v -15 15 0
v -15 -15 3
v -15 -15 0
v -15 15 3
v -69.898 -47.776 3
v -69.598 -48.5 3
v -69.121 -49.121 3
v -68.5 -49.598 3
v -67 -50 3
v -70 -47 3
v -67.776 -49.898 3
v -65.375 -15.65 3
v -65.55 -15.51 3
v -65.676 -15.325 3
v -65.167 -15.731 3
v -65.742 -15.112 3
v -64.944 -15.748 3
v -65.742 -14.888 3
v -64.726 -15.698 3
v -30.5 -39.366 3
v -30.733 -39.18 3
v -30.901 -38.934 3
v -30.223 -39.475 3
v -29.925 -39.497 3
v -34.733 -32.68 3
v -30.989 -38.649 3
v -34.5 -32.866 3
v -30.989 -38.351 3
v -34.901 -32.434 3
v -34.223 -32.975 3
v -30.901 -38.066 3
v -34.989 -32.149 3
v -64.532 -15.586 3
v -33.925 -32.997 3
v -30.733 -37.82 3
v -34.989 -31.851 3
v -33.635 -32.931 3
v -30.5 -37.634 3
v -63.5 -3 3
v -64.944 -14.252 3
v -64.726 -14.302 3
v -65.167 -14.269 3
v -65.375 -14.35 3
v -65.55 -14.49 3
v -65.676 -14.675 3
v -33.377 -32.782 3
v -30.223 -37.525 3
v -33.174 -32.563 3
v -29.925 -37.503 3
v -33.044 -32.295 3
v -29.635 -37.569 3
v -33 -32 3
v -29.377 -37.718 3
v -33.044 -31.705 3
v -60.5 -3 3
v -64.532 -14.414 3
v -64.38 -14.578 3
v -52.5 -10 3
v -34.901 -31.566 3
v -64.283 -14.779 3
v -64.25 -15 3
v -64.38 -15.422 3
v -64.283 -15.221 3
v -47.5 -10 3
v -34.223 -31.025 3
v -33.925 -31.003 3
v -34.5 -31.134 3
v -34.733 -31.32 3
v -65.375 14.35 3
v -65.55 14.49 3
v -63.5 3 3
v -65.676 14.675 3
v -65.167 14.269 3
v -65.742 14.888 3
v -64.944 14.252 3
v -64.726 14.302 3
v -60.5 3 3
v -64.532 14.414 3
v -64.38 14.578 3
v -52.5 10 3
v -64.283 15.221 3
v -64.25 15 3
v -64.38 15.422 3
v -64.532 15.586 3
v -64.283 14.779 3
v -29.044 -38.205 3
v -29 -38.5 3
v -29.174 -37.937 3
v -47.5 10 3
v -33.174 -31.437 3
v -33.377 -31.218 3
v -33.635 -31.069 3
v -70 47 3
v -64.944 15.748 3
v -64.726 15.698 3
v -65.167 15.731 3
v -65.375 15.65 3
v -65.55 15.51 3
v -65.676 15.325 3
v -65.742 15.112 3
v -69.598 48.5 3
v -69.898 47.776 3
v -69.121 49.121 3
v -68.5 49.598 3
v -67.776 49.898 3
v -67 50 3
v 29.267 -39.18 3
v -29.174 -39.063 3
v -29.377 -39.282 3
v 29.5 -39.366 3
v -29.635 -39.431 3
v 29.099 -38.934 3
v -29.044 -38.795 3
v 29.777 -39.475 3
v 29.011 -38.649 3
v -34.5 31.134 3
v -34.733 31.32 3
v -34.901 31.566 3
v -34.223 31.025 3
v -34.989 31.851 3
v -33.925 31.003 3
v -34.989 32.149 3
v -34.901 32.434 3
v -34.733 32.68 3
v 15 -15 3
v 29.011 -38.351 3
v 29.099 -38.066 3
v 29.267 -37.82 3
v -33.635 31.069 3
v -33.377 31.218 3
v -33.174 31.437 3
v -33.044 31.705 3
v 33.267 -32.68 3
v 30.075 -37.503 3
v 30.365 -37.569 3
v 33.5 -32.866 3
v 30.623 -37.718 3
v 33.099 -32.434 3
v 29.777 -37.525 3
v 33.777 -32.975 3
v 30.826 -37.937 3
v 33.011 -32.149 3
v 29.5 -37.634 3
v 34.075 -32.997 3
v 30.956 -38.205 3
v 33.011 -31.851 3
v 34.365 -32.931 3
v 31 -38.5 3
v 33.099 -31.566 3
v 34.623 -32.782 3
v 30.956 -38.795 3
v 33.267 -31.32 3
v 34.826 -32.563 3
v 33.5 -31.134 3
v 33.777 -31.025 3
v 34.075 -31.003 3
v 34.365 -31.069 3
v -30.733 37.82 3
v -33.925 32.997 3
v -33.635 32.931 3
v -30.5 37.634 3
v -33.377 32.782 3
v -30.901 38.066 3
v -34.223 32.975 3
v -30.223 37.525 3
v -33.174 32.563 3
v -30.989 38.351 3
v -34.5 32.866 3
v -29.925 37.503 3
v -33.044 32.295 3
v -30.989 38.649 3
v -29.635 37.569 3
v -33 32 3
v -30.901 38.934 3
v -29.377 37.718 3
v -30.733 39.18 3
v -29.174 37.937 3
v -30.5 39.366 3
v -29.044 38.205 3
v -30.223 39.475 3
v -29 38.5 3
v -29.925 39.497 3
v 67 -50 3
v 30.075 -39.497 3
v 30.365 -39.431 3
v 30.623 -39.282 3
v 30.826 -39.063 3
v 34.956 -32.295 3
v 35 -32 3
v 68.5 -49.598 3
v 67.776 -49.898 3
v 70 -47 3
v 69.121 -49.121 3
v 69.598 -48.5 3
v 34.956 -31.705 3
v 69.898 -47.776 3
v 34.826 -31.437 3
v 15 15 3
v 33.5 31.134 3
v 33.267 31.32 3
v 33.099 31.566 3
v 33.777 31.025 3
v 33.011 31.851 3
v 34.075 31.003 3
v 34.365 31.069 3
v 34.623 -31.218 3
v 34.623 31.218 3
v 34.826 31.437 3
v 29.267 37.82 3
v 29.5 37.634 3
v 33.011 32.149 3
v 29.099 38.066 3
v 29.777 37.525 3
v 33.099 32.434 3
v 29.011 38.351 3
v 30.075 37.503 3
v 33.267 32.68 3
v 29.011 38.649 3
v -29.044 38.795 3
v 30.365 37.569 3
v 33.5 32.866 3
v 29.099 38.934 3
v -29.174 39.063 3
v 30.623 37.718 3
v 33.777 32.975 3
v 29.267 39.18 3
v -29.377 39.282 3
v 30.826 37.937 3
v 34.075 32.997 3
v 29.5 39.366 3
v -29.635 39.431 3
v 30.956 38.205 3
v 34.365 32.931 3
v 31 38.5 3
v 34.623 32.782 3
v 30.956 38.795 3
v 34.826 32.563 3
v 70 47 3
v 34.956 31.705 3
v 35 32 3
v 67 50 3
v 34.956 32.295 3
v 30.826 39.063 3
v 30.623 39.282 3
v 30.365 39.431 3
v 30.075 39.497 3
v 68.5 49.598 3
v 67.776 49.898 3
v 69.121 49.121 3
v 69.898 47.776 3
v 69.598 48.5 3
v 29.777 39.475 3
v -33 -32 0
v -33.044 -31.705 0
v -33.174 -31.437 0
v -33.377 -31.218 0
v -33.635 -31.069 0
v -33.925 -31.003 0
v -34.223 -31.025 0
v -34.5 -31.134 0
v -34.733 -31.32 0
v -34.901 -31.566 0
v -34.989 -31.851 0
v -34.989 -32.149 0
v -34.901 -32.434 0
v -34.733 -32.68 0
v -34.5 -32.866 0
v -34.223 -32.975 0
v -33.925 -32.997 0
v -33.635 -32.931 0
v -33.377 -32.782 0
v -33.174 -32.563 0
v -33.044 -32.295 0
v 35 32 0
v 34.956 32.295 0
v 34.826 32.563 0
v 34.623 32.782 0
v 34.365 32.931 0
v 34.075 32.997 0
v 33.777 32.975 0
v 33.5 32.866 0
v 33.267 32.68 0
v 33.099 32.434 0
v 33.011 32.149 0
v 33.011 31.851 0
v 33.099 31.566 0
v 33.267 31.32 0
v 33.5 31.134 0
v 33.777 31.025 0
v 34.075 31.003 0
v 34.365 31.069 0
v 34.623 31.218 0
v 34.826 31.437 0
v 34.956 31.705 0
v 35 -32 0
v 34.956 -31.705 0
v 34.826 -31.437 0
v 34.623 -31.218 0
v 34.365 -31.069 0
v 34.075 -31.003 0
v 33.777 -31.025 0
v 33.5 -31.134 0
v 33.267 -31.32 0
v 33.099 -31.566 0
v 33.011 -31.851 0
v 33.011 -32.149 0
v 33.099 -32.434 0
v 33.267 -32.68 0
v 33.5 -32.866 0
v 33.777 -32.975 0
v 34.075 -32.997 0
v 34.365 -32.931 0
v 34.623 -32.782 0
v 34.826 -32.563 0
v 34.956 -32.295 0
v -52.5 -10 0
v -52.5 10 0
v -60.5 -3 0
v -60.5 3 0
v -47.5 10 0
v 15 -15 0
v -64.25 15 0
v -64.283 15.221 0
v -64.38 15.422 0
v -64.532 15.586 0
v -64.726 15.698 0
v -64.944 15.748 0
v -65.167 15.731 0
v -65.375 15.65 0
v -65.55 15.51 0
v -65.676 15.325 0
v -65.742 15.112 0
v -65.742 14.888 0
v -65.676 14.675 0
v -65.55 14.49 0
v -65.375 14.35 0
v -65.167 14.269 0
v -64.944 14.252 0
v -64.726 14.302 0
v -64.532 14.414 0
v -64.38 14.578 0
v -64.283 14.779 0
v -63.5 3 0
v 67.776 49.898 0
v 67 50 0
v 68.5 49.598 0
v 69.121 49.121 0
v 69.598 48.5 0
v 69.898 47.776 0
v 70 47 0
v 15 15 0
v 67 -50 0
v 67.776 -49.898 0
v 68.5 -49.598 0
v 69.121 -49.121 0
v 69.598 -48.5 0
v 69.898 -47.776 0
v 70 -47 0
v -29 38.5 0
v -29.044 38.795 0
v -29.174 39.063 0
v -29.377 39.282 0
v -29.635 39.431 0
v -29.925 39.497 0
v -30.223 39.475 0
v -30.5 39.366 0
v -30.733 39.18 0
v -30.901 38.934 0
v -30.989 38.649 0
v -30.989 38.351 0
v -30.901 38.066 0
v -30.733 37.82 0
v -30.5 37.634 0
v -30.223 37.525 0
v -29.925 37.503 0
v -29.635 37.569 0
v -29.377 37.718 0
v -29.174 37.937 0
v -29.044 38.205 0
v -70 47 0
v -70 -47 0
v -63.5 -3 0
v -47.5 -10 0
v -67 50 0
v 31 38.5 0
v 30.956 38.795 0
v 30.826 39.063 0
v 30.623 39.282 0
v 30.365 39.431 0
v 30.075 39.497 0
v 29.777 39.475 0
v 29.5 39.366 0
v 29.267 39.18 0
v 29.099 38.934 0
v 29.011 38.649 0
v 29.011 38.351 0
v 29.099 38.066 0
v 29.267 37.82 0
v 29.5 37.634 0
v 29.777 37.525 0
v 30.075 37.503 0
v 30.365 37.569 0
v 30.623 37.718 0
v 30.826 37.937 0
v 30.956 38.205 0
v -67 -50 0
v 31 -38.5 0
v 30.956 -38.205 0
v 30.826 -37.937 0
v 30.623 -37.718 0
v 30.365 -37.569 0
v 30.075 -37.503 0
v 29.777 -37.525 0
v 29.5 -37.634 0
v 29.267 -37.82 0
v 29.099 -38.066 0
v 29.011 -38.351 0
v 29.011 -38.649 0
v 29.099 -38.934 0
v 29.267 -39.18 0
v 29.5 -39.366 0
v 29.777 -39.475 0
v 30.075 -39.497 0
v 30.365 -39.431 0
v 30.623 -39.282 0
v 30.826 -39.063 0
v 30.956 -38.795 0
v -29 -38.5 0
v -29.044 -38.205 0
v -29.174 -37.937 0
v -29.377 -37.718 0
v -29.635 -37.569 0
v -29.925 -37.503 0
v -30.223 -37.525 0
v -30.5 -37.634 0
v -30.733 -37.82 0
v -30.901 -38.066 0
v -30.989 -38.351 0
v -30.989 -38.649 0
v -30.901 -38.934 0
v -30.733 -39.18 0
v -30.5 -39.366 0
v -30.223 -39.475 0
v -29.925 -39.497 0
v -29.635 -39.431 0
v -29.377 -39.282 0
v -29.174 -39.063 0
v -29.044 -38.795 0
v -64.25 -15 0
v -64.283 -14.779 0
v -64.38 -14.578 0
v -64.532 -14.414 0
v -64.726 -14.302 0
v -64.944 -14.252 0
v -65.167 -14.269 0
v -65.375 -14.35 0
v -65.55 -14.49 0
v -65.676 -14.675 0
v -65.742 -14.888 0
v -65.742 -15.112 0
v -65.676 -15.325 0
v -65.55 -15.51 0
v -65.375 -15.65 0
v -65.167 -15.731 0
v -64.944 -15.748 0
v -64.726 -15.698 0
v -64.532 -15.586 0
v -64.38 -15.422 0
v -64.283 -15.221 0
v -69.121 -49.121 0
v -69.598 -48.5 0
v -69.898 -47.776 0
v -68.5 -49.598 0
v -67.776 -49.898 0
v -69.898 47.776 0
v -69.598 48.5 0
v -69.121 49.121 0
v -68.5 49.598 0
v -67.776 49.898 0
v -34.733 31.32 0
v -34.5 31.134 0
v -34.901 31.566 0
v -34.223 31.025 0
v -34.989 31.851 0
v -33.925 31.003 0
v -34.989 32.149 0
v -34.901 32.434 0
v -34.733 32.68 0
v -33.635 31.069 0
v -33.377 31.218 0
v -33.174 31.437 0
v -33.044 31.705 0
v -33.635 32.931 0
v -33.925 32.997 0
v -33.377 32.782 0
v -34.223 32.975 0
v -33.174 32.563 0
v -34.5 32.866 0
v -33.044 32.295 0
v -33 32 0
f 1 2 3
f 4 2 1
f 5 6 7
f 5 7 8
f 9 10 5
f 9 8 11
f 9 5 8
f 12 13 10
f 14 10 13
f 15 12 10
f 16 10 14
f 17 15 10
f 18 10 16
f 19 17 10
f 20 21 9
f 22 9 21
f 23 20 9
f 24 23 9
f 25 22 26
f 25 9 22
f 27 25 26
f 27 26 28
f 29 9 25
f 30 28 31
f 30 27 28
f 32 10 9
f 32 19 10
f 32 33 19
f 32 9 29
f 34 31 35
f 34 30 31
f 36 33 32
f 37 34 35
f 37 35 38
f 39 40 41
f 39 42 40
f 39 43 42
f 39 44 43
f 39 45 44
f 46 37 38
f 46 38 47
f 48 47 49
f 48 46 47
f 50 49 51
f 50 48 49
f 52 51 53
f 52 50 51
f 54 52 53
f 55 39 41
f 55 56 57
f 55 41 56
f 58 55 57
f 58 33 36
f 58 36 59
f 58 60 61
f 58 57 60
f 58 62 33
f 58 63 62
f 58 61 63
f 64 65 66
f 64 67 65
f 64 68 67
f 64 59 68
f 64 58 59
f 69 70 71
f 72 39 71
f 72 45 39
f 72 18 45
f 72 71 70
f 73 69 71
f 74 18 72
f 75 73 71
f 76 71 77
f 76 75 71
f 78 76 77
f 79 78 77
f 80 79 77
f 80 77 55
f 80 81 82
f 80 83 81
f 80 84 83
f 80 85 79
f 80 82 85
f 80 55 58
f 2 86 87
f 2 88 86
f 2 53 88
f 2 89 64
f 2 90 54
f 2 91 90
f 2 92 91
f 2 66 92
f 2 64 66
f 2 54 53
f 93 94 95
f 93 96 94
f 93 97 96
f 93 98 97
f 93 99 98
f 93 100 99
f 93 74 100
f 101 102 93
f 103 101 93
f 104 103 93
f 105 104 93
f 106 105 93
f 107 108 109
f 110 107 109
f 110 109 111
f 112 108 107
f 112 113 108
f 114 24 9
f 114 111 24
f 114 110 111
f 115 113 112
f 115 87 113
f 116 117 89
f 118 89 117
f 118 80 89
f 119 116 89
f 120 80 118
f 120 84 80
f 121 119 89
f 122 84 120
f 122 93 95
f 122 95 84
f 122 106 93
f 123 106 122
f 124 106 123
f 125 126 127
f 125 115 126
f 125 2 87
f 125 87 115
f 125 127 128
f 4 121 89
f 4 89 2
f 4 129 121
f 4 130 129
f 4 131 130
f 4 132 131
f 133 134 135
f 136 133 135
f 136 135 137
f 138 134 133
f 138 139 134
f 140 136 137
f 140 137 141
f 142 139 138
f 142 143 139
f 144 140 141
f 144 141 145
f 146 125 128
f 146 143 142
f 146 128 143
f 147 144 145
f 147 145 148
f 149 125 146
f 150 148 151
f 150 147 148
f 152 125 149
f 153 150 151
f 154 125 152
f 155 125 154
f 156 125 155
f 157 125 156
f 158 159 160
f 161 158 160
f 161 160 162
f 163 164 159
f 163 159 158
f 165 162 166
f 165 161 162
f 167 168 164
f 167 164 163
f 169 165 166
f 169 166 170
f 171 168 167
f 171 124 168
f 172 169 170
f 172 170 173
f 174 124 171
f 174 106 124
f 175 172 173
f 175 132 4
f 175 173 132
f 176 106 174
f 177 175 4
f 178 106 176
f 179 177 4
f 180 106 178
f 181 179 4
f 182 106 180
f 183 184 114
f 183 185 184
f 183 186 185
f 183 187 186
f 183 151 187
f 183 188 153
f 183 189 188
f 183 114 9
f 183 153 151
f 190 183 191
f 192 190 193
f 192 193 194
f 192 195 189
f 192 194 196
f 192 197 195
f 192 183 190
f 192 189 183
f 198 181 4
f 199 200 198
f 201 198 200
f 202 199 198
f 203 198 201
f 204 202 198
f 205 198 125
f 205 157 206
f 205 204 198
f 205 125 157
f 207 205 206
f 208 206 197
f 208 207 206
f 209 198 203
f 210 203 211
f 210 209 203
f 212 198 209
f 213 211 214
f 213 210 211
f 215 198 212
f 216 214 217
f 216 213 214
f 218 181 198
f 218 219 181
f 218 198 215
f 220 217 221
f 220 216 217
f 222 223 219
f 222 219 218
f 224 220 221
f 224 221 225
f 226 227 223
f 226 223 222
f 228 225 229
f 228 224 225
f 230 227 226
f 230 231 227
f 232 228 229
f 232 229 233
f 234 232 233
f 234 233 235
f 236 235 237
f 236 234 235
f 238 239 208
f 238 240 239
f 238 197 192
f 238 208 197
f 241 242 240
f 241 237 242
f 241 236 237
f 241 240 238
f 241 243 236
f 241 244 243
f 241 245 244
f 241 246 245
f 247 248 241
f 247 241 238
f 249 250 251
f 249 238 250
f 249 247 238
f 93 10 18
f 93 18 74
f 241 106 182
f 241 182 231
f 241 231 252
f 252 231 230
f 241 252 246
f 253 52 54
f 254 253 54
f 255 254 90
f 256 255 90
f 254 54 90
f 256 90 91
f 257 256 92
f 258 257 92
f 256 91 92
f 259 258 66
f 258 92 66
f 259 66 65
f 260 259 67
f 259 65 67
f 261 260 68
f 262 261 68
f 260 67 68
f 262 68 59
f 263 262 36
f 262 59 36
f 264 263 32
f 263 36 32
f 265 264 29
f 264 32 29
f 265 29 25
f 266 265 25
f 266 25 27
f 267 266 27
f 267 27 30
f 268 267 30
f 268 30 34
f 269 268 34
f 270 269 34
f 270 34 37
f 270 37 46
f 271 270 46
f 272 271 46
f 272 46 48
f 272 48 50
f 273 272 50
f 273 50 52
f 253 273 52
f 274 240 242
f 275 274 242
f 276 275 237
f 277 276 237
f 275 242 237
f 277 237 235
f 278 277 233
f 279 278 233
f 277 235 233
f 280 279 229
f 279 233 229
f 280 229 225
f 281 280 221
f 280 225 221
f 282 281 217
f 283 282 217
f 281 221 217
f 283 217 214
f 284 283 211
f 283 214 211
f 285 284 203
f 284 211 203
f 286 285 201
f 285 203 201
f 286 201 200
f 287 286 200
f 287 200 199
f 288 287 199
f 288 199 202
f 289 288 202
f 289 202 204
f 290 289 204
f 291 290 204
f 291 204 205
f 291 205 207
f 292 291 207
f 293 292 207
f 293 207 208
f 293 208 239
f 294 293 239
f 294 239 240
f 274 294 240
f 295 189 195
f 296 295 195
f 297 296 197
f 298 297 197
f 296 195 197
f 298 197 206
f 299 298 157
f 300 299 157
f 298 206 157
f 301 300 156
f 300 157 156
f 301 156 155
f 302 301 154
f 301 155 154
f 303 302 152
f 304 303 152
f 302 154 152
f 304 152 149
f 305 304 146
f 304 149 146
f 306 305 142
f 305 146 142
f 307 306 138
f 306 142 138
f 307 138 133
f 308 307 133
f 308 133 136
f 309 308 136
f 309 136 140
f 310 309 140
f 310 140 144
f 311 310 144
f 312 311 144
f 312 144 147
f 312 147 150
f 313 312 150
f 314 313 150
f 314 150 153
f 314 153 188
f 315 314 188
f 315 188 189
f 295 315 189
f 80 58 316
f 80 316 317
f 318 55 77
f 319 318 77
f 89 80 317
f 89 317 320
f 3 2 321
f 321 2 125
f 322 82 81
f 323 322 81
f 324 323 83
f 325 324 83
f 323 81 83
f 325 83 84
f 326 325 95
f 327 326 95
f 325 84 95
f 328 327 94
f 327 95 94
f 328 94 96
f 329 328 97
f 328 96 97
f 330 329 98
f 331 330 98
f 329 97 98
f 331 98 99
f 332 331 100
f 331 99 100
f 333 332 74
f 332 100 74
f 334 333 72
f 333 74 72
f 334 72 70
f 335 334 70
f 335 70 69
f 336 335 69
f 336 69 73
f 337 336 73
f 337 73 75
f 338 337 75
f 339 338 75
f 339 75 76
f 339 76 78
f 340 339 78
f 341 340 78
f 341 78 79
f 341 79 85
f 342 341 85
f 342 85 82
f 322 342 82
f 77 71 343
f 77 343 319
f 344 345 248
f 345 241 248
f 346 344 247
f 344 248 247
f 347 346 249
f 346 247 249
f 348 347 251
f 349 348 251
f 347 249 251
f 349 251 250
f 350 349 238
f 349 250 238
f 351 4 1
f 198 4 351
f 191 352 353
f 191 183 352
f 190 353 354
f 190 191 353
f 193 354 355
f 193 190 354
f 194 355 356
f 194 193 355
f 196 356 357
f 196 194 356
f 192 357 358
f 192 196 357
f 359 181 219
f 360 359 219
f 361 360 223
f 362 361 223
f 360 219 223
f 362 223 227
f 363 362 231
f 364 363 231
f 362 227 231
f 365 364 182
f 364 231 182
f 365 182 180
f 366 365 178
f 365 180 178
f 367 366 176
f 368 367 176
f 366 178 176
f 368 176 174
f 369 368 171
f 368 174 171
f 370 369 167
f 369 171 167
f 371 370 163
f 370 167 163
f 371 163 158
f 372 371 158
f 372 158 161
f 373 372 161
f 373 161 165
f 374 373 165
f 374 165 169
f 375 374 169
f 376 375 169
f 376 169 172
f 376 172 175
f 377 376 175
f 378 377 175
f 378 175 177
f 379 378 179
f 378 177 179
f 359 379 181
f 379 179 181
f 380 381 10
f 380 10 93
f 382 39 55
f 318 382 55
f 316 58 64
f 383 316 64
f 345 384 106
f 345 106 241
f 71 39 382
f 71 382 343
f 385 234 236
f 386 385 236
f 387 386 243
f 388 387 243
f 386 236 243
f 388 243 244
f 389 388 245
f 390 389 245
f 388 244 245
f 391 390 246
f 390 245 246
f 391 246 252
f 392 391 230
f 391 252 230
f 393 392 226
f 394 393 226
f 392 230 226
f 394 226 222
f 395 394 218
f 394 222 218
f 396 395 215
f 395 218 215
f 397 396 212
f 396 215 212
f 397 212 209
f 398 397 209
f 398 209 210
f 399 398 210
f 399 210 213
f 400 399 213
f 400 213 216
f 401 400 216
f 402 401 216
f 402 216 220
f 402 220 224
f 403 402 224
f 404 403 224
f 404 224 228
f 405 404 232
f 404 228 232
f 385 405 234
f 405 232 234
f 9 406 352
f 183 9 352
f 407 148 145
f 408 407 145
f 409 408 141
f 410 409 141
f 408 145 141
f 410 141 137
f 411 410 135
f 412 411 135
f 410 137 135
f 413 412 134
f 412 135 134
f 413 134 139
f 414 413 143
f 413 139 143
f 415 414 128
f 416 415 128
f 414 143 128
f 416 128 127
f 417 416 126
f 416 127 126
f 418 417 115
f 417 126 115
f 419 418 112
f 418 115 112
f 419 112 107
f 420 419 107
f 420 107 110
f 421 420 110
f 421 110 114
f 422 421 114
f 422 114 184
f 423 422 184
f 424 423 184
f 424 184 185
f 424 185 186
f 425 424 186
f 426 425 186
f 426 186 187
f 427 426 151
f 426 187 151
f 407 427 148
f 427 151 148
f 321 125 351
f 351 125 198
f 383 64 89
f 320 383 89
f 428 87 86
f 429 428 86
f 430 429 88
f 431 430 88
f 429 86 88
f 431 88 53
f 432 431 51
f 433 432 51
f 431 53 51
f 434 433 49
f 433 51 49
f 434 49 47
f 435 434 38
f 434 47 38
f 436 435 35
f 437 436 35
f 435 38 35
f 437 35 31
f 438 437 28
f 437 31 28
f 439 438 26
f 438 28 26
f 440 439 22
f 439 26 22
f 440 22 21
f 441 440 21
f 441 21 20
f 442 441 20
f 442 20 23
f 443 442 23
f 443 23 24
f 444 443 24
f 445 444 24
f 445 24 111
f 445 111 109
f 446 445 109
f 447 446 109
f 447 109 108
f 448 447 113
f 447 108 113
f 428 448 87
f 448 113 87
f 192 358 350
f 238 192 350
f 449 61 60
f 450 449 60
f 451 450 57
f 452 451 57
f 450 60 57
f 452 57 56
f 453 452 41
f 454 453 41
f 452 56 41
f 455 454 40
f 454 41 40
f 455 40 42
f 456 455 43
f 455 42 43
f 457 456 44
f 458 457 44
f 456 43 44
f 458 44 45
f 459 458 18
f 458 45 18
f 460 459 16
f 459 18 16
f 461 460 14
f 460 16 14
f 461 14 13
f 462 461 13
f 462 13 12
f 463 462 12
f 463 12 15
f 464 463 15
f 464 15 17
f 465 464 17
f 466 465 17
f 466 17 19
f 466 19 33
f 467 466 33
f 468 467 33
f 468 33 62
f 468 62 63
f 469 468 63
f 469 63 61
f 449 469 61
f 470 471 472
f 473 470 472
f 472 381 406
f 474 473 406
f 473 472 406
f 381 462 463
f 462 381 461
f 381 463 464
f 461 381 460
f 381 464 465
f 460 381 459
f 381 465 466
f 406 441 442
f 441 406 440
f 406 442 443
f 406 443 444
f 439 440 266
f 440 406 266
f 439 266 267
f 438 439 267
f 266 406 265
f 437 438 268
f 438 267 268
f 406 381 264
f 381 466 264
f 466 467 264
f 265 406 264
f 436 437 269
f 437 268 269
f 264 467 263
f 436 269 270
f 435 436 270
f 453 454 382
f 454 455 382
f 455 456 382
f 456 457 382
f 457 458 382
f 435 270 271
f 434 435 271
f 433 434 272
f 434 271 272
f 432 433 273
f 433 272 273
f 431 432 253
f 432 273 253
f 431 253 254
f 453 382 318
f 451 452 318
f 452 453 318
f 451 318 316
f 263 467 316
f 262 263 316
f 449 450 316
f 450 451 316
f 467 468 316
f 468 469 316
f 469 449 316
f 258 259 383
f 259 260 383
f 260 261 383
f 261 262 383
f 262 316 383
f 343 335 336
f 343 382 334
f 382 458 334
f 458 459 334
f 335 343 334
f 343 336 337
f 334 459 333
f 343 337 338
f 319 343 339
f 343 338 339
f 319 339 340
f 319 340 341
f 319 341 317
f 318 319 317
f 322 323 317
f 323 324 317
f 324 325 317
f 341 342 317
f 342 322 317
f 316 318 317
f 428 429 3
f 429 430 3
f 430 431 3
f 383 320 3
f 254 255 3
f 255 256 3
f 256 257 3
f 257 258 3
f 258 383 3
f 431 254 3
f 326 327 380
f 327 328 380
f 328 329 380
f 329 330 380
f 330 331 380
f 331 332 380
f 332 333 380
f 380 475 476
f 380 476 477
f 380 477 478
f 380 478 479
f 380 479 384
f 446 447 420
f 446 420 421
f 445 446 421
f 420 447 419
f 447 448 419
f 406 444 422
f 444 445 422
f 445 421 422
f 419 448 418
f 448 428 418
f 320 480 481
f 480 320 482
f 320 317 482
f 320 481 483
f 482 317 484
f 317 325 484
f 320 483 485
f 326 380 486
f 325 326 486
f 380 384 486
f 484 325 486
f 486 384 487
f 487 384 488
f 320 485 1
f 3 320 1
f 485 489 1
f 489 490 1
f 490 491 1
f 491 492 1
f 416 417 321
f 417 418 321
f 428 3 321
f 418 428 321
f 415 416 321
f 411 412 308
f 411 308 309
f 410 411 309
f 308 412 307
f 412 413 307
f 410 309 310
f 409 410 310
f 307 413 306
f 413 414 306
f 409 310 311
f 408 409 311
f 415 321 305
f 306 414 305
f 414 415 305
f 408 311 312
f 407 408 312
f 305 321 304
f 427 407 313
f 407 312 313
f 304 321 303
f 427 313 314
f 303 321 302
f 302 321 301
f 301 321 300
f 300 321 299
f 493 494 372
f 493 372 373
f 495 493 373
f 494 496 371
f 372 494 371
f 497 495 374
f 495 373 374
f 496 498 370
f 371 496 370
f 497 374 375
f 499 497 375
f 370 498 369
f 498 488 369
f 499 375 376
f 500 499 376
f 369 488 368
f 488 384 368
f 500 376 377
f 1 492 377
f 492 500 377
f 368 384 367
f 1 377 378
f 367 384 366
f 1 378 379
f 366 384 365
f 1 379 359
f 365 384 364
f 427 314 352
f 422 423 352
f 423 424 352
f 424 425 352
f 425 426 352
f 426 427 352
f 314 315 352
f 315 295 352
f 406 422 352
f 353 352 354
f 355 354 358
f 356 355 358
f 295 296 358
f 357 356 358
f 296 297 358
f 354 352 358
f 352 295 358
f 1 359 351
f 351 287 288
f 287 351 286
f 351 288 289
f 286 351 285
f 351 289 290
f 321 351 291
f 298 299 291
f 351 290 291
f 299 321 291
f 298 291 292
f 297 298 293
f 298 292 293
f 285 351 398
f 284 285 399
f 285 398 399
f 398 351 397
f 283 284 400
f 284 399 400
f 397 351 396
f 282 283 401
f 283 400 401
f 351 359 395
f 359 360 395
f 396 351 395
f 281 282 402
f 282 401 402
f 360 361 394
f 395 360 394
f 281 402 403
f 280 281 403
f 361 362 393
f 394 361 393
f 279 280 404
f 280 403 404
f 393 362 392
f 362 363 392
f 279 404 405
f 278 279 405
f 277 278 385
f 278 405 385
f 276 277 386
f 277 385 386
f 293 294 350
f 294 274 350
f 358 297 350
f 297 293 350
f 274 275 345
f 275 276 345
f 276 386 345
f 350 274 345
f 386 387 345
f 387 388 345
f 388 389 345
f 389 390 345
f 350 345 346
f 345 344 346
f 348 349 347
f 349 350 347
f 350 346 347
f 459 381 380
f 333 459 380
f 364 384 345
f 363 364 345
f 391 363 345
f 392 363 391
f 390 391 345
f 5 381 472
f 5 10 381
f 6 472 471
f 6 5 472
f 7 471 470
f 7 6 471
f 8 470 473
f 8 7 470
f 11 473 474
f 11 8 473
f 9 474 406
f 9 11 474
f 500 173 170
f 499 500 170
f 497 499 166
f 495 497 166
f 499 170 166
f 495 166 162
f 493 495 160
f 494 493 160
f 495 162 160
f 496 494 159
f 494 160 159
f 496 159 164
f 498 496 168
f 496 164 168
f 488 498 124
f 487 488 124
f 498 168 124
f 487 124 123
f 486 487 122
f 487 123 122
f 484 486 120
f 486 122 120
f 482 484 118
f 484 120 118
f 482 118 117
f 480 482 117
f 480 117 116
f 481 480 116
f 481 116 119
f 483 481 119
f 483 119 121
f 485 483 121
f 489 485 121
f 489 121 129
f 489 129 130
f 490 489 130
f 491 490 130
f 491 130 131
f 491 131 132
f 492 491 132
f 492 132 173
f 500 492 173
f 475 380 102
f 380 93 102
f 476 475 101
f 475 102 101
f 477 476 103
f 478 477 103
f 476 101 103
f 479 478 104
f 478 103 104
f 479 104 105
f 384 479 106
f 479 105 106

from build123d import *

# Parameters (mm, degrees)
SKETCH1_W           = 140
SKETCH1_H           = 100
BOSS_EXTRUDE1_DEPTH = 3
SKETCH2_R           = 1
CUT_EXTRUDE1_DEPTH  = 3
CUT_EXTRUDE2_REACH  = 88.076
SKETCH3_R           = 1
CUT_EXTRUDE3_REACH  = 88.076
SKETCH4_R           = 0.75
SKETCH4_W           = 30
SKETCH4_H           = 30
FILLET1_R           = 3
CUT_EXTRUDE4_REACH  = 88.076
SKETCH5_W           = 5
SKETCH5_H           = 20
CUT_EXTRUDE5_REACH  = 88.076
SKETCH6_W           = 3
SKETCH6_H           = 6


with BuildPart() as part:
    # Sketch1 → Boss-Extrude1 (new body)
    with BuildSketch(Plane.XY):
        Rectangle(SKETCH1_W, SKETCH1_H)
    extrude(amount=BOSS_EXTRUDE1_DEPTH)

    # Sketch2 → Cut-Extrude1 (cut)
    with BuildSketch(Plane.XY.offset(3)):
        with Locations((30, 38.5)):
            Circle(SKETCH2_R)
        with Locations((-30, 38.5)):
            Circle(SKETCH2_R)
        with Locations((30, -38.5)):
            Circle(SKETCH2_R)
        with Locations((-30, -38.5)):
            Circle(SKETCH2_R)
    extrude(amount=-CUT_EXTRUDE1_DEPTH, mode=Mode.SUBTRACT)

    # Sketch3 → Cut-Extrude2 (cut, up to next)
    with BuildSketch(Plane.XY.offset(3), mode=Mode.PRIVATE) as cut_extrude2_sk1:
        with Locations((34, 32)):
            Circle(SKETCH3_R)
    cut_extrude2_tool1 = extrude(cut_extrude2_sk1.sketch, amount=-CUT_EXTRUDE2_REACH, mode=Mode.PRIVATE) & part.part
    # Sketch3 → Cut-Extrude2 (cut, up to next)
    with BuildSketch(Plane.XY.offset(3), mode=Mode.PRIVATE) as cut_extrude2_sk2:
        with Locations((34, -32)):
            Circle(SKETCH3_R)
    cut_extrude2_tool2 = extrude(cut_extrude2_sk2.sketch, amount=-CUT_EXTRUDE2_REACH, mode=Mode.PRIVATE) & part.part
    # Sketch3 → Cut-Extrude2 (cut, up to next)
    with BuildSketch(Plane.XY.offset(3), mode=Mode.PRIVATE) as cut_extrude2_sk3:
        with Locations((-34, 32)):
            Circle(SKETCH3_R)
    cut_extrude2_tool3 = extrude(cut_extrude2_sk3.sketch, amount=-CUT_EXTRUDE2_REACH, mode=Mode.PRIVATE) & part.part
    # Sketch3 → Cut-Extrude2 (cut, up to next)
    with BuildSketch(Plane.XY.offset(3), mode=Mode.PRIVATE) as cut_extrude2_sk4:
        with Locations((-34, -32)):
            Circle(SKETCH3_R)
    cut_extrude2_tool4 = extrude(cut_extrude2_sk4.sketch, amount=-CUT_EXTRUDE2_REACH, mode=Mode.PRIVATE) & part.part
    add(cut_extrude2_tool1.solids().sort_by_distance((34, 32, 3))[0], mode=Mode.SUBTRACT)
    add(cut_extrude2_tool2.solids().sort_by_distance((34, -32, 3))[0], mode=Mode.SUBTRACT)
    add(cut_extrude2_tool3.solids().sort_by_distance((-34, 32, 3))[0], mode=Mode.SUBTRACT)
    add(cut_extrude2_tool4.solids().sort_by_distance((-34, -32, 3))[0], mode=Mode.SUBTRACT)

    # Sketch4 → Cut-Extrude3 (cut, up to next)
    with BuildSketch(Plane.XY.offset(3), mode=Mode.PRIVATE) as cut_extrude3_sk1:
        with Locations((-65, 15)):
            Circle(SKETCH4_R)
    cut_extrude3_tool1 = extrude(cut_extrude3_sk1.sketch, amount=-CUT_EXTRUDE3_REACH, mode=Mode.PRIVATE) & part.part
    # Sketch4 → Cut-Extrude3 (cut, up to next)
    with BuildSketch(Plane.XY.offset(3), mode=Mode.PRIVATE) as cut_extrude3_sk2:
        with Locations((-65, -15)):
            Circle(SKETCH4_R)
    cut_extrude3_tool2 = extrude(cut_extrude3_sk2.sketch, amount=-CUT_EXTRUDE3_REACH, mode=Mode.PRIVATE) & part.part
    # Sketch4 → Cut-Extrude3 (cut, up to next)
    with BuildSketch(Plane.XY.offset(3), mode=Mode.PRIVATE) as cut_extrude3_sk3:
        Rectangle(SKETCH4_W, SKETCH4_H)
    cut_extrude3_tool3 = extrude(cut_extrude3_sk3.sketch, amount=-CUT_EXTRUDE3_REACH, mode=Mode.PRIVATE) & part.part
    add(cut_extrude3_tool1.solids().sort_by_distance((-65, 15, 3))[0], mode=Mode.SUBTRACT)
    add(cut_extrude3_tool2.solids().sort_by_distance((-65, -15, 3))[0], mode=Mode.SUBTRACT)
    add(cut_extrude3_tool3.solids().sort_by_distance((0, 0, 3))[0], mode=Mode.SUBTRACT)

    # Fillet1
    fillet1_edges = [part.edges().sort_by_distance(p)[0] for p in [
        (70, -50, 1.5),
        (-70, -50, 1.5),
        (-70, 50, 1.5),
        (70, 50, 1.5),
    ]]
    fillet(fillet1_edges, radius=FILLET1_R)

    # Sketch5 → Cut-Extrude4 (cut, up to next)
    with BuildSketch(Plane.XY.offset(3), mode=Mode.PRIVATE) as cut_extrude4_sk1:
        with Locations((-50, 0)):
            Rectangle(SKETCH5_W, SKETCH5_H)
    cut_extrude4_tool1 = extrude(cut_extrude4_sk1.sketch, amount=-CUT_EXTRUDE4_REACH, mode=Mode.PRIVATE) & part.part
    add(cut_extrude4_tool1.solids().sort_by_distance((-50, 0, 3))[0], mode=Mode.SUBTRACT)

    # Sketch6 → Cut-Extrude5 (cut, up to next)
    with BuildSketch(Plane.XY.offset(3), mode=Mode.PRIVATE) as cut_extrude5_sk1:
        with Locations((-62, 0)):
            Rectangle(SKETCH6_W, SKETCH6_H)
    cut_extrude5_tool1 = extrude(cut_extrude5_sk1.sketch, amount=-CUT_EXTRUDE5_REACH, mode=Mode.PRIVATE) & part.part
    add(cut_extrude5_tool1.solids().sort_by_distance((-62, 0, 3))[0], mode=Mode.SUBTRACT)


solid = part.part
